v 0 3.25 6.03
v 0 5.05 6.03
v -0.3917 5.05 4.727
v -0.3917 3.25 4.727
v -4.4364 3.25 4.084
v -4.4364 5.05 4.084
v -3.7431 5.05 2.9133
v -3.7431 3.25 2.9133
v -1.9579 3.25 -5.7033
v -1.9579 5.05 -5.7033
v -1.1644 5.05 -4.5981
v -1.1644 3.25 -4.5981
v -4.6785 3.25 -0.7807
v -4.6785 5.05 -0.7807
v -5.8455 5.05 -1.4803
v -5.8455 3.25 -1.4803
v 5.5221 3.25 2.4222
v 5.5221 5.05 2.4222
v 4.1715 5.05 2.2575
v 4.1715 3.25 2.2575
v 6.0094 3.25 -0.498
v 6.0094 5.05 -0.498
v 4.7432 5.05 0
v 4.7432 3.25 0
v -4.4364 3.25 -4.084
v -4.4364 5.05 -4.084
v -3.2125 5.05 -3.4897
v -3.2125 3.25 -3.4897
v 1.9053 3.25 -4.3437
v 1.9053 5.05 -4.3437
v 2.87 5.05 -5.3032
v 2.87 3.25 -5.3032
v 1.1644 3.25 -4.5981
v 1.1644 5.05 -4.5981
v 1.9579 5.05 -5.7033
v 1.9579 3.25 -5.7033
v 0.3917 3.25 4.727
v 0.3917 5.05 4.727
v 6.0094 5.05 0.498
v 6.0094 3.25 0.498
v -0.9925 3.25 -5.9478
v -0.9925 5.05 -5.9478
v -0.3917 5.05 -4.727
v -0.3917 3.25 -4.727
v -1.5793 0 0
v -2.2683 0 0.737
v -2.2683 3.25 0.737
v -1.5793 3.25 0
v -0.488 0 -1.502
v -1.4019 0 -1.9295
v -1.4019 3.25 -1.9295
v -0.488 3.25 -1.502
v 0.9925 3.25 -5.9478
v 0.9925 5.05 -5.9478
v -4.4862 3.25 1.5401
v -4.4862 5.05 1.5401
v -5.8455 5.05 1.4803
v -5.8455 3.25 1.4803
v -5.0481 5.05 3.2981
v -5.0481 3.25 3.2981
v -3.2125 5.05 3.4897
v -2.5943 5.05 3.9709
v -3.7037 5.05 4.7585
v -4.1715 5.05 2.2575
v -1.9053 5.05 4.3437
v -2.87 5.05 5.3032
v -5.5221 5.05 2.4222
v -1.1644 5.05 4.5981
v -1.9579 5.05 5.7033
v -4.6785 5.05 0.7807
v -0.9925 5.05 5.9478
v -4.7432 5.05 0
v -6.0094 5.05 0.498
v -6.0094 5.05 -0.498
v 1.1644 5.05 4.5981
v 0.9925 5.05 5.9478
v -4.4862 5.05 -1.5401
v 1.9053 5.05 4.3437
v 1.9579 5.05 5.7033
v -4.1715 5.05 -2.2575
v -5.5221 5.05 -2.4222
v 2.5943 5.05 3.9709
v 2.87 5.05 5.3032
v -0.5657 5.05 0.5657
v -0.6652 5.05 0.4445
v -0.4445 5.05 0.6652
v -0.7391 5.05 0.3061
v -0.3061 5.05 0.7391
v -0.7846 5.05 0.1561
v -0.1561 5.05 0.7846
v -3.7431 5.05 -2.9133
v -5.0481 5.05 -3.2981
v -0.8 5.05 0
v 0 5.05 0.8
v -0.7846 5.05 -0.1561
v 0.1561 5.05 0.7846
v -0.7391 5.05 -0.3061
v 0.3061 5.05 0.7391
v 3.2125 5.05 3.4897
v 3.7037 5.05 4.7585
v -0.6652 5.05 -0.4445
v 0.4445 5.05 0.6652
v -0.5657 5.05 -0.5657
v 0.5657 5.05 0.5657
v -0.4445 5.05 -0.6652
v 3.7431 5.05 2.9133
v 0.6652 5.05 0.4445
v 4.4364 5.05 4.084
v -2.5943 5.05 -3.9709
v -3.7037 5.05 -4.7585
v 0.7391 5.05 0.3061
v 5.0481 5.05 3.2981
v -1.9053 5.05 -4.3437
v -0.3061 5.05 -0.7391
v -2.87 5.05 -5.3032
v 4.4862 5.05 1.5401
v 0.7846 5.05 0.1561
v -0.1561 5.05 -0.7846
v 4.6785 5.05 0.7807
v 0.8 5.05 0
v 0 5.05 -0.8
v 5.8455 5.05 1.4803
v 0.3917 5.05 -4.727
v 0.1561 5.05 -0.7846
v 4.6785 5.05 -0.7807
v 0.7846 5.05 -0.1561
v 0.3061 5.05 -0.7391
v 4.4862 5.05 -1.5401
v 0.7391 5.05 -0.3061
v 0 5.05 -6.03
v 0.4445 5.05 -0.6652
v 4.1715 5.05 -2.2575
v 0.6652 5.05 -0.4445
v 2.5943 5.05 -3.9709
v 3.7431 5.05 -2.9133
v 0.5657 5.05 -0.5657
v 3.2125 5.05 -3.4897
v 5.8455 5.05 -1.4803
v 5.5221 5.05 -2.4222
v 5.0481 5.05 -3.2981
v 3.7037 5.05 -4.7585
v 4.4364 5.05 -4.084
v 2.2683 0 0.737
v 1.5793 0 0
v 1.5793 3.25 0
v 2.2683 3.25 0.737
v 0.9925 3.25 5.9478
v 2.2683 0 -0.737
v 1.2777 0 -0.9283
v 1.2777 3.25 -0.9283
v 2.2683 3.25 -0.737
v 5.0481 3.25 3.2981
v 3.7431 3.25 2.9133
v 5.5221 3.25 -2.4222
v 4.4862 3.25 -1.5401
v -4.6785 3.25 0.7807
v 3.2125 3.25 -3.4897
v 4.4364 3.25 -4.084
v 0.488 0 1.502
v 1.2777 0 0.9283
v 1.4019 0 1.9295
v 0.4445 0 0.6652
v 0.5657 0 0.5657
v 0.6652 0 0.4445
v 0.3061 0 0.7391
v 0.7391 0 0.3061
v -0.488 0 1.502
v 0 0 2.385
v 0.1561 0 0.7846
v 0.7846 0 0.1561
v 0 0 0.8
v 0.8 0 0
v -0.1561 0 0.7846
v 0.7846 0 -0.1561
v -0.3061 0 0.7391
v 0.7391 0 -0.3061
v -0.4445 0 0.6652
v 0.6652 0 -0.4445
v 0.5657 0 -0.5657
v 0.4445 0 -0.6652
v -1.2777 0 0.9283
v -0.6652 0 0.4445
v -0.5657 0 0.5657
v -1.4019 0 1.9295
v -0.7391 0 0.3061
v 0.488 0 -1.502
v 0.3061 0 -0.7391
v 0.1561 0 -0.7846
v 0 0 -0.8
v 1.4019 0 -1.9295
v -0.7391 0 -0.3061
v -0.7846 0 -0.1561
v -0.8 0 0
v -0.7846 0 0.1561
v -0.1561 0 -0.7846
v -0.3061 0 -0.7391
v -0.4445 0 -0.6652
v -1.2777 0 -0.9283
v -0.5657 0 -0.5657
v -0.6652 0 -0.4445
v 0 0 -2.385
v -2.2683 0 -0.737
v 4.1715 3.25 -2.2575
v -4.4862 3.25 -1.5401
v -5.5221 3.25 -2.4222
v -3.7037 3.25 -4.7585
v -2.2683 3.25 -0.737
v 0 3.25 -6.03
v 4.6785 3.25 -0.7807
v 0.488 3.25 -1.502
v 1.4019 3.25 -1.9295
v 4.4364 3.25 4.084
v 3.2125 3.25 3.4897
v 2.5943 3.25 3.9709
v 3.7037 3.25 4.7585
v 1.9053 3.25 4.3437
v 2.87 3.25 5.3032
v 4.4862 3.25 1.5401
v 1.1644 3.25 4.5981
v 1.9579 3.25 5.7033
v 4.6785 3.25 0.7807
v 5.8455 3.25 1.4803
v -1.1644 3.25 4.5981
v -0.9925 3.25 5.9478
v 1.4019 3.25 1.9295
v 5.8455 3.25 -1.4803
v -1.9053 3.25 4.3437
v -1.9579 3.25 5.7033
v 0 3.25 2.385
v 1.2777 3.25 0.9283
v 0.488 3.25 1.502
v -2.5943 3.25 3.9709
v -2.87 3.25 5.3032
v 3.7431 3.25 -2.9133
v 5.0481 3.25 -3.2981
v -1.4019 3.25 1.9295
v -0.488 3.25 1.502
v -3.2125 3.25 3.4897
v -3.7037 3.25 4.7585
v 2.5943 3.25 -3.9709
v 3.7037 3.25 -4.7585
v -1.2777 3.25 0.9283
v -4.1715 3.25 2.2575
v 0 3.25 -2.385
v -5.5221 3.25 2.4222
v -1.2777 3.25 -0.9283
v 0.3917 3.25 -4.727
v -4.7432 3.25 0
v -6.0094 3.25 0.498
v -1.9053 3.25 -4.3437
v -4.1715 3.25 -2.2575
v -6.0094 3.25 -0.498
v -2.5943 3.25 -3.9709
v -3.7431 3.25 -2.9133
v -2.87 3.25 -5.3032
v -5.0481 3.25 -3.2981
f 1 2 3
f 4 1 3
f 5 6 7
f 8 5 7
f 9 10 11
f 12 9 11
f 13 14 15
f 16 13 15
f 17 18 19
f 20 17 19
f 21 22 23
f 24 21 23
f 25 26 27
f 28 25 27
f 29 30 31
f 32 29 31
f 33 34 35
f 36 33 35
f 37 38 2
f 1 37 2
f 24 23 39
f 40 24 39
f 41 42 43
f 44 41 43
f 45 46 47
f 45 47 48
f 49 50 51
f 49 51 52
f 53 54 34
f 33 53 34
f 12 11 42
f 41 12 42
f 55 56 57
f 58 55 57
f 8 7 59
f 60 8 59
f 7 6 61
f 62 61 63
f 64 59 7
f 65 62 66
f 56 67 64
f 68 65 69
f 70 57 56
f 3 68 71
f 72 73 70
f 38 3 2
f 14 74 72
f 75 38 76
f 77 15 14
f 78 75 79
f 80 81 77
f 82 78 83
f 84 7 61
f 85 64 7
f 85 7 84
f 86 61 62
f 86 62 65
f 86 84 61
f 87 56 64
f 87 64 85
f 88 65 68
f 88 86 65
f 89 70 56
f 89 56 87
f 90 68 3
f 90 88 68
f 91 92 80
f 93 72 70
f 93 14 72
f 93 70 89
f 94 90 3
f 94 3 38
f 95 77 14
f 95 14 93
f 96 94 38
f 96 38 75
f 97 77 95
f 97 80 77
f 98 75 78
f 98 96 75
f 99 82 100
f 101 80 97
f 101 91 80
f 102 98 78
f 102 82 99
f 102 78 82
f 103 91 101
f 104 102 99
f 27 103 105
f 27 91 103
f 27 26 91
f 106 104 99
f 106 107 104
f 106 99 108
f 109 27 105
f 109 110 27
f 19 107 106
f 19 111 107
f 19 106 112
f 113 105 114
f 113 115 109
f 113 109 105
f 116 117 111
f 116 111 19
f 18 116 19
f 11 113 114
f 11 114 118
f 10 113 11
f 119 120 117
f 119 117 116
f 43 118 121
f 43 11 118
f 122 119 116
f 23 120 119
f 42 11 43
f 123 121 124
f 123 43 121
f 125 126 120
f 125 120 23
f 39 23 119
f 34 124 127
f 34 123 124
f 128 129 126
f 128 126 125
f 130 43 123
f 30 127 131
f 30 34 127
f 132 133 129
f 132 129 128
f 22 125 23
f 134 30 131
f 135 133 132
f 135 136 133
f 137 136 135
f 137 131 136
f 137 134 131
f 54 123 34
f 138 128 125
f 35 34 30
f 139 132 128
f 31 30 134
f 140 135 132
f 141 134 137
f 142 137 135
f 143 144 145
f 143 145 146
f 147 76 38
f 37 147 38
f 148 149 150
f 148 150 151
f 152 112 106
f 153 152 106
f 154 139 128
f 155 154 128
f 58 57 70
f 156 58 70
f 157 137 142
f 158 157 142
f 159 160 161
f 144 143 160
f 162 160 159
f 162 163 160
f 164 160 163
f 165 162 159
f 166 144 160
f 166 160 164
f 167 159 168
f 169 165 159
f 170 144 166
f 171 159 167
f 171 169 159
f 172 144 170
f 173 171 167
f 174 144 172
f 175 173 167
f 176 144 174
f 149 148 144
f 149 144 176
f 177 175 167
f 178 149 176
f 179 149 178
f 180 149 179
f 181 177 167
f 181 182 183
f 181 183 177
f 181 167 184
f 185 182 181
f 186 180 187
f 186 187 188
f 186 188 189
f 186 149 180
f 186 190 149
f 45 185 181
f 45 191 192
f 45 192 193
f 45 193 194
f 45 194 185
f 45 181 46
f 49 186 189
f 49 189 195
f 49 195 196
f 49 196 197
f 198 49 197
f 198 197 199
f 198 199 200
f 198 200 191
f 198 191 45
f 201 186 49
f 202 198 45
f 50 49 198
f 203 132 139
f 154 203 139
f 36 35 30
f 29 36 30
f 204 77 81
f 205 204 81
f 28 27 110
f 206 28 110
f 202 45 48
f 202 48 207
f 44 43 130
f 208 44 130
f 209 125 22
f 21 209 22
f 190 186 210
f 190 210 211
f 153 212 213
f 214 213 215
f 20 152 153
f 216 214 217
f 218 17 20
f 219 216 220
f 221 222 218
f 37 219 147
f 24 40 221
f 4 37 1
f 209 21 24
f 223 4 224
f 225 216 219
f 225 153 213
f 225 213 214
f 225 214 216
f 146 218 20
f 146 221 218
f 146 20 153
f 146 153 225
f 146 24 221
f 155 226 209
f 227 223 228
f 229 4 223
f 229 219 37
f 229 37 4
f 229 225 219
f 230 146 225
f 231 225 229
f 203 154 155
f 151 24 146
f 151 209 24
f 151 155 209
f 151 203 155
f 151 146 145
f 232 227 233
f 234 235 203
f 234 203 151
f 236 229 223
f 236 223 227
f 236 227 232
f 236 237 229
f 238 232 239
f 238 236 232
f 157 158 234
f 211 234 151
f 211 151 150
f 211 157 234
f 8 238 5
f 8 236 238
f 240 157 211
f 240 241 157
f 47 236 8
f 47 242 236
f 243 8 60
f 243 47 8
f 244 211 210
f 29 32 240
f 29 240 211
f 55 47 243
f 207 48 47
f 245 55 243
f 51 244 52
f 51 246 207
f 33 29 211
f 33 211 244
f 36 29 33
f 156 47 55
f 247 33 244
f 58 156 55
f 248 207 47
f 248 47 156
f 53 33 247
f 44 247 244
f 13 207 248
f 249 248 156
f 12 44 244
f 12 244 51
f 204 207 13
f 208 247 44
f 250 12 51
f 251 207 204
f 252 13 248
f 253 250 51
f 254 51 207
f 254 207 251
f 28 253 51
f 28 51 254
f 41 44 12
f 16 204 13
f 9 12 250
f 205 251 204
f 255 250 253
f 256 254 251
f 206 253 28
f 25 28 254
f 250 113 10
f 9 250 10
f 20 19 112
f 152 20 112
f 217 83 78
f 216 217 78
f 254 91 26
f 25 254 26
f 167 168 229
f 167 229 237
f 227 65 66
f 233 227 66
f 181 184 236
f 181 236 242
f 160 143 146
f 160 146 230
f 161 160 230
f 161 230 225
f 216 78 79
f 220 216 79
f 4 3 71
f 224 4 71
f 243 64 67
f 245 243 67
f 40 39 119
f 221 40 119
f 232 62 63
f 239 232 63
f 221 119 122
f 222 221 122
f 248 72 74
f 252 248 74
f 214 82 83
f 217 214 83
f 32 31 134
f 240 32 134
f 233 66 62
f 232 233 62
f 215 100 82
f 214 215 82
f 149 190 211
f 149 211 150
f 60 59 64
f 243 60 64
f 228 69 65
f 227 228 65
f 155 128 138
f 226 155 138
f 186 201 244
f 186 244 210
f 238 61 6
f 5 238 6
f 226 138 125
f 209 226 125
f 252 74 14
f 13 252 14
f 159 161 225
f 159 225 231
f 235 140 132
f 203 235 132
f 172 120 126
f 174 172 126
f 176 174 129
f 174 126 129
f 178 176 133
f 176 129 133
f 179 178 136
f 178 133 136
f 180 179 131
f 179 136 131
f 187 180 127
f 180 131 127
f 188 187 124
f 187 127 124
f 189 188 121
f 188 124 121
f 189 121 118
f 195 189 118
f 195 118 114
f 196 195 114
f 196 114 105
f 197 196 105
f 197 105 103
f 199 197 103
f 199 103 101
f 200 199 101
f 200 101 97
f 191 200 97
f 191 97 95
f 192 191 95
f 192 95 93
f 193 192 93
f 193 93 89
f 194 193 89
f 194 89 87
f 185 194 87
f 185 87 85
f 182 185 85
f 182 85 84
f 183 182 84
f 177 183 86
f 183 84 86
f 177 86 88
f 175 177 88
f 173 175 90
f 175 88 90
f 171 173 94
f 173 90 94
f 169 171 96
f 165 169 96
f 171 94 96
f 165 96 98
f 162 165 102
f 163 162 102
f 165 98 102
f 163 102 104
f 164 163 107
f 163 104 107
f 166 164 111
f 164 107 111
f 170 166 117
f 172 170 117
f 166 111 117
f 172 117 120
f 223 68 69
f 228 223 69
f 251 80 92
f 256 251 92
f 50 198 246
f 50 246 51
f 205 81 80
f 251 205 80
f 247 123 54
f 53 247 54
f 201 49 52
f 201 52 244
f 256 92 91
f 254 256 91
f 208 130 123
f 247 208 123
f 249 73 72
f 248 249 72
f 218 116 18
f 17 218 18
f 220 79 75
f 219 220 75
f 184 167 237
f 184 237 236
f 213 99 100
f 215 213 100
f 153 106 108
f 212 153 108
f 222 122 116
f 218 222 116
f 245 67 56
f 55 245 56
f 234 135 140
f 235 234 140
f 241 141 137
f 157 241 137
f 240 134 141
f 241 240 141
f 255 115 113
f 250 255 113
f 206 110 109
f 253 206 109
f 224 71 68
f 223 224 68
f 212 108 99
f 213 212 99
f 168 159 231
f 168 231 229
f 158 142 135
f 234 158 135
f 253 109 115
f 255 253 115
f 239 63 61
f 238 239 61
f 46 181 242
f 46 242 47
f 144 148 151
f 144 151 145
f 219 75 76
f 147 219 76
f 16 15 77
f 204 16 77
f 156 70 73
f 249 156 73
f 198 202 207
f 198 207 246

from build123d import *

# Parameters (mm, degrees)
SKETCH2_R          = 0.8
CUT_EXTRUDE1_DEPTH = 6.05
CUT_EXTRUDE2_DEPTH = 6.05
CIRPATTERN1_COUNT  = 38
CUT_EXTRUDE3_DEPTH = 3.25
CIRPATTERN2_COUNT  = 10


with BuildPart() as part:
    # Sketch1 → Revolve1 (revolve)
    with BuildSketch(Plane.XY):
        Polygon((-6.03, 5.05), (-6.03, 3.25), (-2.385, 3.25), (-2.385, 0), (0, 0), (0, 5.05), align=None)
    revolve(axis=Axis((0, 5.05, 0), (0, -1, 0)))

    # Sketch2 → Cut-Extrude1 (cut, through all)
    with BuildSketch(Plane(origin=(0, 5.05, 0), x_dir=(1, 0, 0), z_dir=(0, 1, 0))):
        Circle(SKETCH2_R)
    extrude(amount=-CUT_EXTRUDE1_DEPTH, mode=Mode.SUBTRACT)

    # Sketch3 → Cut-Extrude2 (cut, through all)
    with BuildSketch(Plane(origin=(0, 5.05, 0), x_dir=(1, 0, 0), z_dir=(0, 1, 0))):
        with BuildLine():
            Line((0, 6.03), (0.391691416, 4.727012418))
            Line((0.391691416, 4.727012418), (0.992505379, 5.94775866))
            ThreePointArc((0.992505379, 5.94775866), (0.497953453, 6.009404493), (0, 6.03))
        make_face()
    cut_extrude2 = extrude(amount=-CUT_EXTRUDE2_DEPTH, mode=Mode.SUBTRACT)

    # CirPattern1: Cut-Extrude2 ×38 about axis
    cirpattern1_axis = Axis((0, 0, 0), (0, 1, 0))
    for i in range(1, CIRPATTERN1_COUNT):
        add(cut_extrude2.rotate(cirpattern1_axis, i * 360 / CIRPATTERN1_COUNT), mode=Mode.SUBTRACT)

    # Sketch4 → Cut-Extrude3 (cut)
    with BuildSketch(Plane.XZ):
        with BuildLine():
            Line((1.401867827, 1.929505532), (0.488038951, 1.502029444))
            Line((0.488038951, 1.502029444), (0, 2.385))
            ThreePointArc((0, 2.385), (0.737005532, 2.268269791), (1.401867827, 1.929505532))
        make_face()
    cut_extrude3 = extrude(amount=-CUT_EXTRUDE3_DEPTH, mode=Mode.SUBTRACT)

    # CirPattern2: Cut-Extrude3 ×10 about axis
    cirpattern2_axis = Axis((0, 0, 0), (0, 1, 0))
    for i in range(1, CIRPATTERN2_COUNT):
        add(cut_extrude3.rotate(cirpattern2_axis, i * 360 / CIRPATTERN2_COUNT), mode=Mode.SUBTRACT)


solid = part.part
